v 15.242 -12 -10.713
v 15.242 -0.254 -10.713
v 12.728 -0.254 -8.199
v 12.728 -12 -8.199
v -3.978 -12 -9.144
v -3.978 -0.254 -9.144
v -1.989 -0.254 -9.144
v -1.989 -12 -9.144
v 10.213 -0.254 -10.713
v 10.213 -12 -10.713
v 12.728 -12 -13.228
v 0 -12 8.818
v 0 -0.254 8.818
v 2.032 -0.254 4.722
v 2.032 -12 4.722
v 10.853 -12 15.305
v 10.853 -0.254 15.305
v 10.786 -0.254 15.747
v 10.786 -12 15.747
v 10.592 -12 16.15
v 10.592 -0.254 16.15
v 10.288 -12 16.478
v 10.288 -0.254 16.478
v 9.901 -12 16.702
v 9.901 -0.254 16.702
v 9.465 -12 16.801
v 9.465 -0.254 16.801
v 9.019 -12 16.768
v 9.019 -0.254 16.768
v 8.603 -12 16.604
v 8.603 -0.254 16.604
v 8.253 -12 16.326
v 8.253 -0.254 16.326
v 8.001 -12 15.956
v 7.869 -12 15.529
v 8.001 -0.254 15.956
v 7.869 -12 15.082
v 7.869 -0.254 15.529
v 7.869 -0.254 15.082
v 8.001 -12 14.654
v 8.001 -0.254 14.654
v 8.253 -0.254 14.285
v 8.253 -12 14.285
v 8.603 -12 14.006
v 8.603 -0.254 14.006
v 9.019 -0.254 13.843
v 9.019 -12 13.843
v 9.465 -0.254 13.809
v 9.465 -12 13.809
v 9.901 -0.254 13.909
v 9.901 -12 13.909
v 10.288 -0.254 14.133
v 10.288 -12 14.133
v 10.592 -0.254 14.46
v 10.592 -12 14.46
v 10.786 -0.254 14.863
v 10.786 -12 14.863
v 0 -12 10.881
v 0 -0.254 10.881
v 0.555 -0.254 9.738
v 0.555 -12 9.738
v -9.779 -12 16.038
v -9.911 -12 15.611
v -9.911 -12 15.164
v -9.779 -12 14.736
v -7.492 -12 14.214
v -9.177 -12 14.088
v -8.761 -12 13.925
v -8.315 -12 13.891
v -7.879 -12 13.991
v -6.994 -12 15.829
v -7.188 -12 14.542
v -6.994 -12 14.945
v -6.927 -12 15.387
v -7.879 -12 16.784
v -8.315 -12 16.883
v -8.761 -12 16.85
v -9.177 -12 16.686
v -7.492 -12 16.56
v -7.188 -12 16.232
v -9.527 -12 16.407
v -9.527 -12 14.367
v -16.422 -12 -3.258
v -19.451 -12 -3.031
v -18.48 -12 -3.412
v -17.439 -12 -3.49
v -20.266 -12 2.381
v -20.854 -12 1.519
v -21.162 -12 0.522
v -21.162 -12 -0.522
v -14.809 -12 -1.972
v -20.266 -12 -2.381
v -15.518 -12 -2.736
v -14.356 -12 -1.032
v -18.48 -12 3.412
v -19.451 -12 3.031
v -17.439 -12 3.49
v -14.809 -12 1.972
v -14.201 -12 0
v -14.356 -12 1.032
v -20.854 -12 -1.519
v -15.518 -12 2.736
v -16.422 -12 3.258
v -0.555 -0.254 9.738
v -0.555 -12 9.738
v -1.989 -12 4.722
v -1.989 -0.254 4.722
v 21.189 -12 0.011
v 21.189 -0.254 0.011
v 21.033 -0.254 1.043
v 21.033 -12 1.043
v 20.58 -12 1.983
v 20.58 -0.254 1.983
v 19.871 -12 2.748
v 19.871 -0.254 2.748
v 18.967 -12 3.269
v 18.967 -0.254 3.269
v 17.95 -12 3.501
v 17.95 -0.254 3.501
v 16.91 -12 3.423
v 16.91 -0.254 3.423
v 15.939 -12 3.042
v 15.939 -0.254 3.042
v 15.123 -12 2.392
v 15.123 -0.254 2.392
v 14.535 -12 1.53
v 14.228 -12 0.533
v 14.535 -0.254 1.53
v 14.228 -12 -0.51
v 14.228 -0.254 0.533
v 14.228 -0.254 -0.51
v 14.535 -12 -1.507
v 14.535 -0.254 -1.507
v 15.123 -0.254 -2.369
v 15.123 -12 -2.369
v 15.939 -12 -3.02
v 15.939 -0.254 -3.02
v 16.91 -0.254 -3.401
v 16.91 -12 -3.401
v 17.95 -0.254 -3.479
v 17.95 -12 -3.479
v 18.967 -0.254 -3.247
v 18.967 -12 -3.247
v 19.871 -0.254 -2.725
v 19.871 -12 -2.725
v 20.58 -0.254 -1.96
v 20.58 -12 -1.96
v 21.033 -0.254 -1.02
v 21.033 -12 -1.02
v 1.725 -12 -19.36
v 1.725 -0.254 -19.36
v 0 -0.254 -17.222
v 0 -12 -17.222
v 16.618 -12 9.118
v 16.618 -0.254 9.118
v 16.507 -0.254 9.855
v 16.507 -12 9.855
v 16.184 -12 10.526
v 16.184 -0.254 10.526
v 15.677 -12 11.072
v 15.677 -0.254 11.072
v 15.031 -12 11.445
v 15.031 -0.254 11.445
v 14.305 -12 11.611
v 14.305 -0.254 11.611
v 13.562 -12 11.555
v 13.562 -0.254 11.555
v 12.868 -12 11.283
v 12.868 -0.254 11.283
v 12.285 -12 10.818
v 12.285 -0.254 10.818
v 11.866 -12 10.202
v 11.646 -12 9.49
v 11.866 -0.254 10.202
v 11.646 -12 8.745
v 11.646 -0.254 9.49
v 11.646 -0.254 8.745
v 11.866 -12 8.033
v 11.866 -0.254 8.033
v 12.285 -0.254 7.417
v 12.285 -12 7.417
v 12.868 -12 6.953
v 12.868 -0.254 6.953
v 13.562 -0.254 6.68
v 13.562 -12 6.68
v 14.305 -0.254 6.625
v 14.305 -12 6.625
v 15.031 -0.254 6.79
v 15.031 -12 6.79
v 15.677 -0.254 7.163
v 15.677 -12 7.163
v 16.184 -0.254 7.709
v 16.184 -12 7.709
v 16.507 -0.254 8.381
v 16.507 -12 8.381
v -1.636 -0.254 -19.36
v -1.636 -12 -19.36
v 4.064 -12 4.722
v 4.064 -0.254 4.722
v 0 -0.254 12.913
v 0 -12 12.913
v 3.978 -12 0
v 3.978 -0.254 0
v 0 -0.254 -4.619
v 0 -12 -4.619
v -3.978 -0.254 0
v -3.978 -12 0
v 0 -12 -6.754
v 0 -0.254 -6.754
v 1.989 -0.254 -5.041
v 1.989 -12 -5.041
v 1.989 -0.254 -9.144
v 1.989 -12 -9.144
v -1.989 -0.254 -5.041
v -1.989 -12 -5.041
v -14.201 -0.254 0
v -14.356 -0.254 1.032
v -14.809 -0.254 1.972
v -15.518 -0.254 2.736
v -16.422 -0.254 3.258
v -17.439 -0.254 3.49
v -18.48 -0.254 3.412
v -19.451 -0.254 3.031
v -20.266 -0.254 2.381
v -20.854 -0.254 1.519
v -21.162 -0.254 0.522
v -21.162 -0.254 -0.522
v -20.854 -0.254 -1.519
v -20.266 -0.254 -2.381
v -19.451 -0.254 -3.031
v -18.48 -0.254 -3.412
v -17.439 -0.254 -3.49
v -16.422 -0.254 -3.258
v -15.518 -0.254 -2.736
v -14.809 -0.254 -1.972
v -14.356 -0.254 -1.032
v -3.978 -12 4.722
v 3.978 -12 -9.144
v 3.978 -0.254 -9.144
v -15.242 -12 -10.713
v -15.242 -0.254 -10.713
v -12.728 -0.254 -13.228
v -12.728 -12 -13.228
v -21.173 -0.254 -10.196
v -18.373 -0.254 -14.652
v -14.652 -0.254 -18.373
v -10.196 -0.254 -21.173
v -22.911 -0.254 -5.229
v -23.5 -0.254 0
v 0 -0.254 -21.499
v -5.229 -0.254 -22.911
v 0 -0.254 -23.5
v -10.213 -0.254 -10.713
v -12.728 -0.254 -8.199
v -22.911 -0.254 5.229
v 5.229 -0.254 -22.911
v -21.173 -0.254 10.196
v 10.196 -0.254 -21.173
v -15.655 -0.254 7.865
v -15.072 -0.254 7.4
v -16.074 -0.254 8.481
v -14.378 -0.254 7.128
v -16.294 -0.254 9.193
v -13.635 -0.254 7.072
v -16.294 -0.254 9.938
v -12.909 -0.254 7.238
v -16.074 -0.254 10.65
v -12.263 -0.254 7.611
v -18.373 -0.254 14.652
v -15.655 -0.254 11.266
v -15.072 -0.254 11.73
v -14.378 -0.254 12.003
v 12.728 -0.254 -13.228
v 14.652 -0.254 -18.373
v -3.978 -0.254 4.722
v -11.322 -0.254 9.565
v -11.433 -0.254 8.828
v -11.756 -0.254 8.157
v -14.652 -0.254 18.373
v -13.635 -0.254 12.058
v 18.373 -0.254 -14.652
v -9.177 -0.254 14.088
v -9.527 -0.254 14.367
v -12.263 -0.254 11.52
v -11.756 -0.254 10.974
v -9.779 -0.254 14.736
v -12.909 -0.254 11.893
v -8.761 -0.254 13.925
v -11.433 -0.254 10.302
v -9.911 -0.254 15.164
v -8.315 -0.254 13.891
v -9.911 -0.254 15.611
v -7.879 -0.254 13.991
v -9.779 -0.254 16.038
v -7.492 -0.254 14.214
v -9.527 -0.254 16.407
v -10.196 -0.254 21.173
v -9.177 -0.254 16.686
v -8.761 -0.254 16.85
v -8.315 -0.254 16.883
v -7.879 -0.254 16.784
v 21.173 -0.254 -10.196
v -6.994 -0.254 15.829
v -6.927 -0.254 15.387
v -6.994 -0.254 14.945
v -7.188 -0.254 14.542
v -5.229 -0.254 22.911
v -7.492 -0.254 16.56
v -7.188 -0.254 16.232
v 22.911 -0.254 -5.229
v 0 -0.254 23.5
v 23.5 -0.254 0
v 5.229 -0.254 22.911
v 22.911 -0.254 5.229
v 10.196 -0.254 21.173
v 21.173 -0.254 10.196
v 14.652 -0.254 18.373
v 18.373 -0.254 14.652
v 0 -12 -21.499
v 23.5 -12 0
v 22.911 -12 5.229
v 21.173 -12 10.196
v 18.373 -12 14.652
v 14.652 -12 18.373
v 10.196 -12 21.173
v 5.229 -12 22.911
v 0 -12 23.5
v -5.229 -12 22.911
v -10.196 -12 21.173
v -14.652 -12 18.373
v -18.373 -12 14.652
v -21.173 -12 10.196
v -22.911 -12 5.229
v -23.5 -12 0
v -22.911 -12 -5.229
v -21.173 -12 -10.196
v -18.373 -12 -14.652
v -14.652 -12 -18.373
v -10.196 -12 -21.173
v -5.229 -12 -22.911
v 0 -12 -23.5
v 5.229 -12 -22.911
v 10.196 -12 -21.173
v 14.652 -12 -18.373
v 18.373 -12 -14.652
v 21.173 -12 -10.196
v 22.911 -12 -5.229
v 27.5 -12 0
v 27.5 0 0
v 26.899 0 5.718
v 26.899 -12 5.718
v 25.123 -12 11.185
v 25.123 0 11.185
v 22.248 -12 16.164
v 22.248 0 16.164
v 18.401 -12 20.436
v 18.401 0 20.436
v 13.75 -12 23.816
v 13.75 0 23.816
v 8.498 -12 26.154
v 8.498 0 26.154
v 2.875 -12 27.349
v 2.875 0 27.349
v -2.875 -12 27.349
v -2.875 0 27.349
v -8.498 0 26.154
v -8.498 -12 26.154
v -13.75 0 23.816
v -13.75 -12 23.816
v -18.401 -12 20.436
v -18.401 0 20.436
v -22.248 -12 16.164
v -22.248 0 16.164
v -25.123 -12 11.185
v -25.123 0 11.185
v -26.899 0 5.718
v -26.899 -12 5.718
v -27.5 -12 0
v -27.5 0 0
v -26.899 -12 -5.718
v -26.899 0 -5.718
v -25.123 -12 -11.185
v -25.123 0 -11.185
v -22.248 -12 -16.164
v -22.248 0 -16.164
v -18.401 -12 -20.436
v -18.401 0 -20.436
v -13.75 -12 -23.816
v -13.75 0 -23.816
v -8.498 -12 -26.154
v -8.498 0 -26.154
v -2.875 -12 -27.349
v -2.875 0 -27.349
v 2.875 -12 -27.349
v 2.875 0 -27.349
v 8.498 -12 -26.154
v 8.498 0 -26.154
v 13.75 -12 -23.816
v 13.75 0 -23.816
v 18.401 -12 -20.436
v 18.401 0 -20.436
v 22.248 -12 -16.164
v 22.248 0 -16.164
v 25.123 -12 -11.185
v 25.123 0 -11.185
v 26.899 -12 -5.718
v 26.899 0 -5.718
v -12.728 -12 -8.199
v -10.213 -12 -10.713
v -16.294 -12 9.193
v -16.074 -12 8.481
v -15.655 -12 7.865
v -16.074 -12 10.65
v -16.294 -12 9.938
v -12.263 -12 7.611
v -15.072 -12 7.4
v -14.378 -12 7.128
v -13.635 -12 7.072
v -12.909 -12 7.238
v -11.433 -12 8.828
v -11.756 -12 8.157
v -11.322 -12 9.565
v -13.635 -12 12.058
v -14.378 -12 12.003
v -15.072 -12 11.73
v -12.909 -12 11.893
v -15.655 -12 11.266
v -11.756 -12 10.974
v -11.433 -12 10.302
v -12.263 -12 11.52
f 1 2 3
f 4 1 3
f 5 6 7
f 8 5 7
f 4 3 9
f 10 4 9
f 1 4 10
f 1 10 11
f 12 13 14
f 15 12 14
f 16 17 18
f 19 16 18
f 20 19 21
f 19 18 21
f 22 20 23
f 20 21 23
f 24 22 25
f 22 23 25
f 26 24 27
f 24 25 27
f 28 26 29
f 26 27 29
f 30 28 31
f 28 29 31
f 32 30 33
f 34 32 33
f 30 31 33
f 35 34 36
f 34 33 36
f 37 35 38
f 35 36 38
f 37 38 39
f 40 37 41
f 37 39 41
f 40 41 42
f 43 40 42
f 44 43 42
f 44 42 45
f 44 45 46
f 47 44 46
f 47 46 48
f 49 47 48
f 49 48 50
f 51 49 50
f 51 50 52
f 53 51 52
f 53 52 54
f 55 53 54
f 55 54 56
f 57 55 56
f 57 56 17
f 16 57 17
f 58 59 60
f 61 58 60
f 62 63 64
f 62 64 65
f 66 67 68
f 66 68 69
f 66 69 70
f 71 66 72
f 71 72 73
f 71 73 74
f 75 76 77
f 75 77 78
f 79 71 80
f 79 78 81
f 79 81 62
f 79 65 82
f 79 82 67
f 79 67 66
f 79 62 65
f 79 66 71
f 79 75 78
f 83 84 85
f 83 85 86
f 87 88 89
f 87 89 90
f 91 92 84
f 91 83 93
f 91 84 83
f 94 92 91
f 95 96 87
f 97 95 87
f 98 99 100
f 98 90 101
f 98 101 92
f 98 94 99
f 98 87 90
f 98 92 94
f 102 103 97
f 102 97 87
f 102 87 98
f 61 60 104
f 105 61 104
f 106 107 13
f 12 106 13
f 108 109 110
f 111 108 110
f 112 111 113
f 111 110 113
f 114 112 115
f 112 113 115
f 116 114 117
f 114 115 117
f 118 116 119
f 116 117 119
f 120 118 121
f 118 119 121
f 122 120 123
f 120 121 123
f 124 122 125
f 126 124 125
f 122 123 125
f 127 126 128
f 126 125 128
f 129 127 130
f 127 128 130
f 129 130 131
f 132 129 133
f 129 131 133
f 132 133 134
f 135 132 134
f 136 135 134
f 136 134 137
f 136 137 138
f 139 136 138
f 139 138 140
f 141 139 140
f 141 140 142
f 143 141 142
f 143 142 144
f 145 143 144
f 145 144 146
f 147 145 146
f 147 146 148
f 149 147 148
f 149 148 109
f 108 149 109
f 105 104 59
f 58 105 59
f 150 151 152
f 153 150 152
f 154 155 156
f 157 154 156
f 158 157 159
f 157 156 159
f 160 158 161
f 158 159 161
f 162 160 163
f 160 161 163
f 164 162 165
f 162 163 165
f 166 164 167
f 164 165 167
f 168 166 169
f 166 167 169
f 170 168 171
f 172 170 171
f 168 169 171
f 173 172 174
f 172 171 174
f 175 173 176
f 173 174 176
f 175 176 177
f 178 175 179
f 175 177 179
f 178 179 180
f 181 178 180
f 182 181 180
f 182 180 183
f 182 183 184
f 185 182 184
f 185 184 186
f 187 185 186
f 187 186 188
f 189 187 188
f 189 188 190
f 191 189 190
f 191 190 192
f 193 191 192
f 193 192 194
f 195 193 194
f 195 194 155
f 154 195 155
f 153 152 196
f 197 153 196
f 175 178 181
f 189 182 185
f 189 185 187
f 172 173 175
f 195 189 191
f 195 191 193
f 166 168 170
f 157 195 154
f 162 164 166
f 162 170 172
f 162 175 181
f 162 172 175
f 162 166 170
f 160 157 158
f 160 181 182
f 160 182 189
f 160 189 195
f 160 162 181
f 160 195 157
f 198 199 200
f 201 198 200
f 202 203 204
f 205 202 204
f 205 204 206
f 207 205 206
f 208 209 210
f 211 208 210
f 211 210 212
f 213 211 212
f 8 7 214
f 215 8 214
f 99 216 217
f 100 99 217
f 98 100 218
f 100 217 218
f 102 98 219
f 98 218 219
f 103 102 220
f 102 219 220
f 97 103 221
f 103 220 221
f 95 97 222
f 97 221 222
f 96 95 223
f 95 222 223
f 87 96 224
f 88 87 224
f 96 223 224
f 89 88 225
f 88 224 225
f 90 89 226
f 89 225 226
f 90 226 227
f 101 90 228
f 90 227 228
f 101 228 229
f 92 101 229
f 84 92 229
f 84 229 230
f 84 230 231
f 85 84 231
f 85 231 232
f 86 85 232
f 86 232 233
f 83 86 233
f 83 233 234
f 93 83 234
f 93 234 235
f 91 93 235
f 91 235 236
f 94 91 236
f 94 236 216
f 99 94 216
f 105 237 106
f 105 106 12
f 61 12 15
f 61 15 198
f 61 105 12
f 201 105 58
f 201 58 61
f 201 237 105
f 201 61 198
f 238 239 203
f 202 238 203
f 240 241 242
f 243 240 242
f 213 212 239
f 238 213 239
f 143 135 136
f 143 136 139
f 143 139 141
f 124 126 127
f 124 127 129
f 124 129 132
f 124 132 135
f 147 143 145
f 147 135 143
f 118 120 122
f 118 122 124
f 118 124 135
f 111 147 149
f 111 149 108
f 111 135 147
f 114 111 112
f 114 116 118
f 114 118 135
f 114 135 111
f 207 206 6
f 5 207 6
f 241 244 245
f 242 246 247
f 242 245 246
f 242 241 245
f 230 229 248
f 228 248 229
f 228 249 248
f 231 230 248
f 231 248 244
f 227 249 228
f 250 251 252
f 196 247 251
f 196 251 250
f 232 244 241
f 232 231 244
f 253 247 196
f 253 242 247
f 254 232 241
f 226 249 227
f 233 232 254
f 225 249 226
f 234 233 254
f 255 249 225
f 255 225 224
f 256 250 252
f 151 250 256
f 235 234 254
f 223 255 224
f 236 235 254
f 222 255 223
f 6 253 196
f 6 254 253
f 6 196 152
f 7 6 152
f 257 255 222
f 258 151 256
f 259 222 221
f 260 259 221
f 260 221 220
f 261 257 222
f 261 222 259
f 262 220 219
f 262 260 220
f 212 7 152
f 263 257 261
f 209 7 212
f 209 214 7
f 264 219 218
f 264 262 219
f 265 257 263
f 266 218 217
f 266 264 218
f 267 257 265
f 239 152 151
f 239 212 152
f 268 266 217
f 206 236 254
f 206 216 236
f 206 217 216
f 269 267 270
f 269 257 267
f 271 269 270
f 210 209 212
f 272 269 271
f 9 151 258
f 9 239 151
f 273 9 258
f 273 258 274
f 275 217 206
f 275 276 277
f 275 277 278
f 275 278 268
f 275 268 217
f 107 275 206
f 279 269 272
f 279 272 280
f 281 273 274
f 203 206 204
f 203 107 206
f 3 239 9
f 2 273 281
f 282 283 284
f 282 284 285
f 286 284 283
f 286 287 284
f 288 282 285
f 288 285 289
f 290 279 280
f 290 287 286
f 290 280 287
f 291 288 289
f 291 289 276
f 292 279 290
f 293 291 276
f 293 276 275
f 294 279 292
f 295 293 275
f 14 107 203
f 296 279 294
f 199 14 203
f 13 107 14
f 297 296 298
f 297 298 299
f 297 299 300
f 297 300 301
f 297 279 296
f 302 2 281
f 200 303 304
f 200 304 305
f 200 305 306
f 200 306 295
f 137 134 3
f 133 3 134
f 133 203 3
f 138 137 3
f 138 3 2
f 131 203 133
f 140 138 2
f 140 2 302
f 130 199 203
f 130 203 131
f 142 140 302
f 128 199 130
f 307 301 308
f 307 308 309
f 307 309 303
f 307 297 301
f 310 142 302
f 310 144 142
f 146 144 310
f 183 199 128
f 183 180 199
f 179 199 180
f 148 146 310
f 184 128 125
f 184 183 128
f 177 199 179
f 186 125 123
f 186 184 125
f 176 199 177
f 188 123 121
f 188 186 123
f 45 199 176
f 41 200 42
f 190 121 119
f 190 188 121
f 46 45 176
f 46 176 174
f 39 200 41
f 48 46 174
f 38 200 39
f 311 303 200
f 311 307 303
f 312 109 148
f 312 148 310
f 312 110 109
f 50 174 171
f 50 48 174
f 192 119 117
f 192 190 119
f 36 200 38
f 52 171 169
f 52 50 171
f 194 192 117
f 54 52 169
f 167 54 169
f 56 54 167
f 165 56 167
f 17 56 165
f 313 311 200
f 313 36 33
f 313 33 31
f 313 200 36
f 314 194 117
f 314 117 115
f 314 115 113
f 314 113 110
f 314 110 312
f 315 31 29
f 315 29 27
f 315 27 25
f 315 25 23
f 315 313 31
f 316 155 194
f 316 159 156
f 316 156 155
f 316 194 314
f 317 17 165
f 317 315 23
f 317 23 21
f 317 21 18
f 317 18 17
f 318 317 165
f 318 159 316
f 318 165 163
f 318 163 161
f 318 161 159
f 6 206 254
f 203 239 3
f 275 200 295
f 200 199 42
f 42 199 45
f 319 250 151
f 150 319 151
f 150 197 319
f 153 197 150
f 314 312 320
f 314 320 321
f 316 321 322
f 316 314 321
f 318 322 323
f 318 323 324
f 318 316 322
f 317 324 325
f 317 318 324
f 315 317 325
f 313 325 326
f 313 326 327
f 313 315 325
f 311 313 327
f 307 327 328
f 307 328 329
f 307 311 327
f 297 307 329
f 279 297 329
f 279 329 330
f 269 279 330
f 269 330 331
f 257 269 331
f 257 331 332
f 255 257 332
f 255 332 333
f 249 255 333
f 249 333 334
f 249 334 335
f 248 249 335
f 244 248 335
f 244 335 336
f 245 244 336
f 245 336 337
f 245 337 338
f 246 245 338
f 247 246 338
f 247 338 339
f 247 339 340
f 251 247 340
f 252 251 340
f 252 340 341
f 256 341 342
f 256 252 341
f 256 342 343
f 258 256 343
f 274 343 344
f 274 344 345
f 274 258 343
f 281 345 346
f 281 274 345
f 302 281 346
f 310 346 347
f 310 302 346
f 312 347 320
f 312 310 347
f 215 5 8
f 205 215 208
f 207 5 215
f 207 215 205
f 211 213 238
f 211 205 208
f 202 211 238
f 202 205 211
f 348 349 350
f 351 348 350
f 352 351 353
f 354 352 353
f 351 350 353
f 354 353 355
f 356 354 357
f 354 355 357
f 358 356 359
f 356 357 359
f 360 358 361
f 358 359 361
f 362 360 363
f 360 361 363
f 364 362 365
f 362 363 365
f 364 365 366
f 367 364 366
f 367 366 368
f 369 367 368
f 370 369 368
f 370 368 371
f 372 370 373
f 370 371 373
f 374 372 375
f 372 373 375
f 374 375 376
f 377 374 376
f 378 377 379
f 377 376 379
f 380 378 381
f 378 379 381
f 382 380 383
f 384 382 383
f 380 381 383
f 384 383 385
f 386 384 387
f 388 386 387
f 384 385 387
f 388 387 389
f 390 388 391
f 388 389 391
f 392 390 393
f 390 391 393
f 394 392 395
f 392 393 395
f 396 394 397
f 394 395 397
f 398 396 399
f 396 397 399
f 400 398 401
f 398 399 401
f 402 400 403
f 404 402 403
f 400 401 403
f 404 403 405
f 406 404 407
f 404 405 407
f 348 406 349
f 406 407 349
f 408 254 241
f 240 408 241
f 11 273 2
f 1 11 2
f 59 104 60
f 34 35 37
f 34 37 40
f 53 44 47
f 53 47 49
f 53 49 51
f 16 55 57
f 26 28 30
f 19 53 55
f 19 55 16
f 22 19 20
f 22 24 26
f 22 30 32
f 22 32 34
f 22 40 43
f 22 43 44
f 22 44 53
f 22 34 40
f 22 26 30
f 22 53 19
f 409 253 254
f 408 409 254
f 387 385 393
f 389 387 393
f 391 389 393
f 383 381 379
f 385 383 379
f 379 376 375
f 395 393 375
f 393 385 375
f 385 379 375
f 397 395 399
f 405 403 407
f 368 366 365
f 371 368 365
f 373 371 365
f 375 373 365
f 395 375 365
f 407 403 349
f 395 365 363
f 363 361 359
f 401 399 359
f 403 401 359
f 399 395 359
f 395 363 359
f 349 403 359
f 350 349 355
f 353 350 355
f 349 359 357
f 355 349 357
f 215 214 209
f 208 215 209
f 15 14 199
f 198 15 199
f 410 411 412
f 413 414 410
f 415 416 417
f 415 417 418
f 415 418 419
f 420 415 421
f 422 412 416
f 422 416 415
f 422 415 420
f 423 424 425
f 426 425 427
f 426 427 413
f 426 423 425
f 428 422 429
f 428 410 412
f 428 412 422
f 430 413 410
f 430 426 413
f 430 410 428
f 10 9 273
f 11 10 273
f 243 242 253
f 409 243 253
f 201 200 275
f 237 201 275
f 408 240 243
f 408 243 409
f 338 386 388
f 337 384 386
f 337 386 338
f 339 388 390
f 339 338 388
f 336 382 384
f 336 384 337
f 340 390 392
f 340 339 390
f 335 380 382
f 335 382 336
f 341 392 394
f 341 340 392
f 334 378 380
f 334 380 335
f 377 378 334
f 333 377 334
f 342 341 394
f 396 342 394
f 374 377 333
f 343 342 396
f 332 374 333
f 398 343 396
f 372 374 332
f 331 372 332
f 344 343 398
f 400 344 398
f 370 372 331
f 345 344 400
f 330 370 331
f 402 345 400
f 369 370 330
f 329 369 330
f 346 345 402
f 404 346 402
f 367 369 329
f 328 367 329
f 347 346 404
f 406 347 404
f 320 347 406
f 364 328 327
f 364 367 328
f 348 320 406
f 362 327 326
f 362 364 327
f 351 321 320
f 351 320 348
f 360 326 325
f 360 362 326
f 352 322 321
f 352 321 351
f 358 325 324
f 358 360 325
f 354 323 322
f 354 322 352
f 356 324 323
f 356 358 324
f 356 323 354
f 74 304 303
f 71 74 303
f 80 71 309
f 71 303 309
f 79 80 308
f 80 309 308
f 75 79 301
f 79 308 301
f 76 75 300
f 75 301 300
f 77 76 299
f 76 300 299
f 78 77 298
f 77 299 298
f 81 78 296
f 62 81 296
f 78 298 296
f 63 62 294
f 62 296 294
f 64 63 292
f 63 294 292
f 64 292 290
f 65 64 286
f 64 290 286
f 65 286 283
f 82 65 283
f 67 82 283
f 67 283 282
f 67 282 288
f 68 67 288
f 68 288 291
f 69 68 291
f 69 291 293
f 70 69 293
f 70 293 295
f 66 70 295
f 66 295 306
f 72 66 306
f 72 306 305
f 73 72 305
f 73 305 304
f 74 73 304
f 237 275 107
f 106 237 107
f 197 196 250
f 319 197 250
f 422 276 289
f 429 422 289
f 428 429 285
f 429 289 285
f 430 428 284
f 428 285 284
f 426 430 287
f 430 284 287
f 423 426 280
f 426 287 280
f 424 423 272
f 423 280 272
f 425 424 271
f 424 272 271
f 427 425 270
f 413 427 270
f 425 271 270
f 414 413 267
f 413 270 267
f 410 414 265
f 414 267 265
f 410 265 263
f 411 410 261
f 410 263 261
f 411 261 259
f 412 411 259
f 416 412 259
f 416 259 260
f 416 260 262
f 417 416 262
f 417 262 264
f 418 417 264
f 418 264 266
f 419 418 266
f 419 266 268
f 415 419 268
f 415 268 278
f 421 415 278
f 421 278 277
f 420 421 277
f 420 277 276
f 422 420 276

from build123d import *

# Parameters (mm, degrees)
F0_R     = 27.5
F0_R_2   = 23.5
F1_DEPTH = 12
F2_R     = 27.467617
F3_DEPTH = 0.254
F4_R     = 3.5
F4_R_2   = 2.5
F4_R_3   = 1.5
F5_DEPTH = 12
F7_DEPTH = 12
F9_DEPTH = 12


with BuildPart() as f1:
    # F0 (on Front) → F1 (new body)
    with BuildSketch(Plane.XZ):
        Circle(F0_R)
        Circle(F0_R_2, mode=Mode.SUBTRACT)
    extrude(amount=F1_DEPTH)

    # F2 (on Front) → F3 (join)
    with BuildSketch(Plane.XZ):
        Circle(F2_R)
    extrude(amount=F3_DEPTH)

    # F4 (on Front) → F5 (join)
    with BuildSketch(Plane.XZ):
        with Locations((17.688596, 0.011209)):
            Circle(F4_R)
        with Locations((-17.700713, 0)):
            Circle(F4_R)
        with Locations((-13.821965, 9.565342)):
            Circle(F4_R_2)
        with Locations((-8.427355, 15.38721)):
            Circle(F4_R_3)
        with Locations((9.352645, 15.305277)):
            Circle(F4_R_3)
        with Locations((14.118035, 9.117616)):
            Circle(F4_R_2)
    extrude(amount=F5_DEPTH)

    # F6 (on Front) → F7 (join)
    with BuildSketch(Plane.XZ):
        Polygon((4.064, 4.721983), (0, 12.913237), (-3.977783, 4.721983), (-1.988892, 4.721983), (0, 8.81761), (2.032, 4.721983), align=None)
        Polygon((-0.554775, 9.738115), (0, 10.880535), (0.554775, 9.738115), align=None, mode=Mode.SUBTRACT)
        Polygon((0, -4.619357), (-3.977783, 0), (-3.977783, -9.144), (-1.988892, -9.144), (-1.988892, -5.041345), (0, -6.754003), (1.988892, -5.041345), (1.988892, -9.144), (3.977783, -9.144), (3.977783, 0), align=None)
    extrude(amount=F7_DEPTH)

    # F8 (on Front) → F9 (join)
    with BuildSketch(Plane.XZ):
        Polygon((-10.213404, -10.713155), (-12.727875, -8.198683), (-15.242347, -10.713155), (-12.727875, -13.227626), align=None)
        Polygon((12.727869, -8.198683), (10.213398, -10.713155), (12.727869, -13.227626), (15.242341, -10.713155), align=None)
        Polygon((1.725041, -19.36011), (0, -17.221719), (-1.635694, -19.36011), (0, -21.498501), align=None)
    extrude(amount=F9_DEPTH)


solid = f1.part
